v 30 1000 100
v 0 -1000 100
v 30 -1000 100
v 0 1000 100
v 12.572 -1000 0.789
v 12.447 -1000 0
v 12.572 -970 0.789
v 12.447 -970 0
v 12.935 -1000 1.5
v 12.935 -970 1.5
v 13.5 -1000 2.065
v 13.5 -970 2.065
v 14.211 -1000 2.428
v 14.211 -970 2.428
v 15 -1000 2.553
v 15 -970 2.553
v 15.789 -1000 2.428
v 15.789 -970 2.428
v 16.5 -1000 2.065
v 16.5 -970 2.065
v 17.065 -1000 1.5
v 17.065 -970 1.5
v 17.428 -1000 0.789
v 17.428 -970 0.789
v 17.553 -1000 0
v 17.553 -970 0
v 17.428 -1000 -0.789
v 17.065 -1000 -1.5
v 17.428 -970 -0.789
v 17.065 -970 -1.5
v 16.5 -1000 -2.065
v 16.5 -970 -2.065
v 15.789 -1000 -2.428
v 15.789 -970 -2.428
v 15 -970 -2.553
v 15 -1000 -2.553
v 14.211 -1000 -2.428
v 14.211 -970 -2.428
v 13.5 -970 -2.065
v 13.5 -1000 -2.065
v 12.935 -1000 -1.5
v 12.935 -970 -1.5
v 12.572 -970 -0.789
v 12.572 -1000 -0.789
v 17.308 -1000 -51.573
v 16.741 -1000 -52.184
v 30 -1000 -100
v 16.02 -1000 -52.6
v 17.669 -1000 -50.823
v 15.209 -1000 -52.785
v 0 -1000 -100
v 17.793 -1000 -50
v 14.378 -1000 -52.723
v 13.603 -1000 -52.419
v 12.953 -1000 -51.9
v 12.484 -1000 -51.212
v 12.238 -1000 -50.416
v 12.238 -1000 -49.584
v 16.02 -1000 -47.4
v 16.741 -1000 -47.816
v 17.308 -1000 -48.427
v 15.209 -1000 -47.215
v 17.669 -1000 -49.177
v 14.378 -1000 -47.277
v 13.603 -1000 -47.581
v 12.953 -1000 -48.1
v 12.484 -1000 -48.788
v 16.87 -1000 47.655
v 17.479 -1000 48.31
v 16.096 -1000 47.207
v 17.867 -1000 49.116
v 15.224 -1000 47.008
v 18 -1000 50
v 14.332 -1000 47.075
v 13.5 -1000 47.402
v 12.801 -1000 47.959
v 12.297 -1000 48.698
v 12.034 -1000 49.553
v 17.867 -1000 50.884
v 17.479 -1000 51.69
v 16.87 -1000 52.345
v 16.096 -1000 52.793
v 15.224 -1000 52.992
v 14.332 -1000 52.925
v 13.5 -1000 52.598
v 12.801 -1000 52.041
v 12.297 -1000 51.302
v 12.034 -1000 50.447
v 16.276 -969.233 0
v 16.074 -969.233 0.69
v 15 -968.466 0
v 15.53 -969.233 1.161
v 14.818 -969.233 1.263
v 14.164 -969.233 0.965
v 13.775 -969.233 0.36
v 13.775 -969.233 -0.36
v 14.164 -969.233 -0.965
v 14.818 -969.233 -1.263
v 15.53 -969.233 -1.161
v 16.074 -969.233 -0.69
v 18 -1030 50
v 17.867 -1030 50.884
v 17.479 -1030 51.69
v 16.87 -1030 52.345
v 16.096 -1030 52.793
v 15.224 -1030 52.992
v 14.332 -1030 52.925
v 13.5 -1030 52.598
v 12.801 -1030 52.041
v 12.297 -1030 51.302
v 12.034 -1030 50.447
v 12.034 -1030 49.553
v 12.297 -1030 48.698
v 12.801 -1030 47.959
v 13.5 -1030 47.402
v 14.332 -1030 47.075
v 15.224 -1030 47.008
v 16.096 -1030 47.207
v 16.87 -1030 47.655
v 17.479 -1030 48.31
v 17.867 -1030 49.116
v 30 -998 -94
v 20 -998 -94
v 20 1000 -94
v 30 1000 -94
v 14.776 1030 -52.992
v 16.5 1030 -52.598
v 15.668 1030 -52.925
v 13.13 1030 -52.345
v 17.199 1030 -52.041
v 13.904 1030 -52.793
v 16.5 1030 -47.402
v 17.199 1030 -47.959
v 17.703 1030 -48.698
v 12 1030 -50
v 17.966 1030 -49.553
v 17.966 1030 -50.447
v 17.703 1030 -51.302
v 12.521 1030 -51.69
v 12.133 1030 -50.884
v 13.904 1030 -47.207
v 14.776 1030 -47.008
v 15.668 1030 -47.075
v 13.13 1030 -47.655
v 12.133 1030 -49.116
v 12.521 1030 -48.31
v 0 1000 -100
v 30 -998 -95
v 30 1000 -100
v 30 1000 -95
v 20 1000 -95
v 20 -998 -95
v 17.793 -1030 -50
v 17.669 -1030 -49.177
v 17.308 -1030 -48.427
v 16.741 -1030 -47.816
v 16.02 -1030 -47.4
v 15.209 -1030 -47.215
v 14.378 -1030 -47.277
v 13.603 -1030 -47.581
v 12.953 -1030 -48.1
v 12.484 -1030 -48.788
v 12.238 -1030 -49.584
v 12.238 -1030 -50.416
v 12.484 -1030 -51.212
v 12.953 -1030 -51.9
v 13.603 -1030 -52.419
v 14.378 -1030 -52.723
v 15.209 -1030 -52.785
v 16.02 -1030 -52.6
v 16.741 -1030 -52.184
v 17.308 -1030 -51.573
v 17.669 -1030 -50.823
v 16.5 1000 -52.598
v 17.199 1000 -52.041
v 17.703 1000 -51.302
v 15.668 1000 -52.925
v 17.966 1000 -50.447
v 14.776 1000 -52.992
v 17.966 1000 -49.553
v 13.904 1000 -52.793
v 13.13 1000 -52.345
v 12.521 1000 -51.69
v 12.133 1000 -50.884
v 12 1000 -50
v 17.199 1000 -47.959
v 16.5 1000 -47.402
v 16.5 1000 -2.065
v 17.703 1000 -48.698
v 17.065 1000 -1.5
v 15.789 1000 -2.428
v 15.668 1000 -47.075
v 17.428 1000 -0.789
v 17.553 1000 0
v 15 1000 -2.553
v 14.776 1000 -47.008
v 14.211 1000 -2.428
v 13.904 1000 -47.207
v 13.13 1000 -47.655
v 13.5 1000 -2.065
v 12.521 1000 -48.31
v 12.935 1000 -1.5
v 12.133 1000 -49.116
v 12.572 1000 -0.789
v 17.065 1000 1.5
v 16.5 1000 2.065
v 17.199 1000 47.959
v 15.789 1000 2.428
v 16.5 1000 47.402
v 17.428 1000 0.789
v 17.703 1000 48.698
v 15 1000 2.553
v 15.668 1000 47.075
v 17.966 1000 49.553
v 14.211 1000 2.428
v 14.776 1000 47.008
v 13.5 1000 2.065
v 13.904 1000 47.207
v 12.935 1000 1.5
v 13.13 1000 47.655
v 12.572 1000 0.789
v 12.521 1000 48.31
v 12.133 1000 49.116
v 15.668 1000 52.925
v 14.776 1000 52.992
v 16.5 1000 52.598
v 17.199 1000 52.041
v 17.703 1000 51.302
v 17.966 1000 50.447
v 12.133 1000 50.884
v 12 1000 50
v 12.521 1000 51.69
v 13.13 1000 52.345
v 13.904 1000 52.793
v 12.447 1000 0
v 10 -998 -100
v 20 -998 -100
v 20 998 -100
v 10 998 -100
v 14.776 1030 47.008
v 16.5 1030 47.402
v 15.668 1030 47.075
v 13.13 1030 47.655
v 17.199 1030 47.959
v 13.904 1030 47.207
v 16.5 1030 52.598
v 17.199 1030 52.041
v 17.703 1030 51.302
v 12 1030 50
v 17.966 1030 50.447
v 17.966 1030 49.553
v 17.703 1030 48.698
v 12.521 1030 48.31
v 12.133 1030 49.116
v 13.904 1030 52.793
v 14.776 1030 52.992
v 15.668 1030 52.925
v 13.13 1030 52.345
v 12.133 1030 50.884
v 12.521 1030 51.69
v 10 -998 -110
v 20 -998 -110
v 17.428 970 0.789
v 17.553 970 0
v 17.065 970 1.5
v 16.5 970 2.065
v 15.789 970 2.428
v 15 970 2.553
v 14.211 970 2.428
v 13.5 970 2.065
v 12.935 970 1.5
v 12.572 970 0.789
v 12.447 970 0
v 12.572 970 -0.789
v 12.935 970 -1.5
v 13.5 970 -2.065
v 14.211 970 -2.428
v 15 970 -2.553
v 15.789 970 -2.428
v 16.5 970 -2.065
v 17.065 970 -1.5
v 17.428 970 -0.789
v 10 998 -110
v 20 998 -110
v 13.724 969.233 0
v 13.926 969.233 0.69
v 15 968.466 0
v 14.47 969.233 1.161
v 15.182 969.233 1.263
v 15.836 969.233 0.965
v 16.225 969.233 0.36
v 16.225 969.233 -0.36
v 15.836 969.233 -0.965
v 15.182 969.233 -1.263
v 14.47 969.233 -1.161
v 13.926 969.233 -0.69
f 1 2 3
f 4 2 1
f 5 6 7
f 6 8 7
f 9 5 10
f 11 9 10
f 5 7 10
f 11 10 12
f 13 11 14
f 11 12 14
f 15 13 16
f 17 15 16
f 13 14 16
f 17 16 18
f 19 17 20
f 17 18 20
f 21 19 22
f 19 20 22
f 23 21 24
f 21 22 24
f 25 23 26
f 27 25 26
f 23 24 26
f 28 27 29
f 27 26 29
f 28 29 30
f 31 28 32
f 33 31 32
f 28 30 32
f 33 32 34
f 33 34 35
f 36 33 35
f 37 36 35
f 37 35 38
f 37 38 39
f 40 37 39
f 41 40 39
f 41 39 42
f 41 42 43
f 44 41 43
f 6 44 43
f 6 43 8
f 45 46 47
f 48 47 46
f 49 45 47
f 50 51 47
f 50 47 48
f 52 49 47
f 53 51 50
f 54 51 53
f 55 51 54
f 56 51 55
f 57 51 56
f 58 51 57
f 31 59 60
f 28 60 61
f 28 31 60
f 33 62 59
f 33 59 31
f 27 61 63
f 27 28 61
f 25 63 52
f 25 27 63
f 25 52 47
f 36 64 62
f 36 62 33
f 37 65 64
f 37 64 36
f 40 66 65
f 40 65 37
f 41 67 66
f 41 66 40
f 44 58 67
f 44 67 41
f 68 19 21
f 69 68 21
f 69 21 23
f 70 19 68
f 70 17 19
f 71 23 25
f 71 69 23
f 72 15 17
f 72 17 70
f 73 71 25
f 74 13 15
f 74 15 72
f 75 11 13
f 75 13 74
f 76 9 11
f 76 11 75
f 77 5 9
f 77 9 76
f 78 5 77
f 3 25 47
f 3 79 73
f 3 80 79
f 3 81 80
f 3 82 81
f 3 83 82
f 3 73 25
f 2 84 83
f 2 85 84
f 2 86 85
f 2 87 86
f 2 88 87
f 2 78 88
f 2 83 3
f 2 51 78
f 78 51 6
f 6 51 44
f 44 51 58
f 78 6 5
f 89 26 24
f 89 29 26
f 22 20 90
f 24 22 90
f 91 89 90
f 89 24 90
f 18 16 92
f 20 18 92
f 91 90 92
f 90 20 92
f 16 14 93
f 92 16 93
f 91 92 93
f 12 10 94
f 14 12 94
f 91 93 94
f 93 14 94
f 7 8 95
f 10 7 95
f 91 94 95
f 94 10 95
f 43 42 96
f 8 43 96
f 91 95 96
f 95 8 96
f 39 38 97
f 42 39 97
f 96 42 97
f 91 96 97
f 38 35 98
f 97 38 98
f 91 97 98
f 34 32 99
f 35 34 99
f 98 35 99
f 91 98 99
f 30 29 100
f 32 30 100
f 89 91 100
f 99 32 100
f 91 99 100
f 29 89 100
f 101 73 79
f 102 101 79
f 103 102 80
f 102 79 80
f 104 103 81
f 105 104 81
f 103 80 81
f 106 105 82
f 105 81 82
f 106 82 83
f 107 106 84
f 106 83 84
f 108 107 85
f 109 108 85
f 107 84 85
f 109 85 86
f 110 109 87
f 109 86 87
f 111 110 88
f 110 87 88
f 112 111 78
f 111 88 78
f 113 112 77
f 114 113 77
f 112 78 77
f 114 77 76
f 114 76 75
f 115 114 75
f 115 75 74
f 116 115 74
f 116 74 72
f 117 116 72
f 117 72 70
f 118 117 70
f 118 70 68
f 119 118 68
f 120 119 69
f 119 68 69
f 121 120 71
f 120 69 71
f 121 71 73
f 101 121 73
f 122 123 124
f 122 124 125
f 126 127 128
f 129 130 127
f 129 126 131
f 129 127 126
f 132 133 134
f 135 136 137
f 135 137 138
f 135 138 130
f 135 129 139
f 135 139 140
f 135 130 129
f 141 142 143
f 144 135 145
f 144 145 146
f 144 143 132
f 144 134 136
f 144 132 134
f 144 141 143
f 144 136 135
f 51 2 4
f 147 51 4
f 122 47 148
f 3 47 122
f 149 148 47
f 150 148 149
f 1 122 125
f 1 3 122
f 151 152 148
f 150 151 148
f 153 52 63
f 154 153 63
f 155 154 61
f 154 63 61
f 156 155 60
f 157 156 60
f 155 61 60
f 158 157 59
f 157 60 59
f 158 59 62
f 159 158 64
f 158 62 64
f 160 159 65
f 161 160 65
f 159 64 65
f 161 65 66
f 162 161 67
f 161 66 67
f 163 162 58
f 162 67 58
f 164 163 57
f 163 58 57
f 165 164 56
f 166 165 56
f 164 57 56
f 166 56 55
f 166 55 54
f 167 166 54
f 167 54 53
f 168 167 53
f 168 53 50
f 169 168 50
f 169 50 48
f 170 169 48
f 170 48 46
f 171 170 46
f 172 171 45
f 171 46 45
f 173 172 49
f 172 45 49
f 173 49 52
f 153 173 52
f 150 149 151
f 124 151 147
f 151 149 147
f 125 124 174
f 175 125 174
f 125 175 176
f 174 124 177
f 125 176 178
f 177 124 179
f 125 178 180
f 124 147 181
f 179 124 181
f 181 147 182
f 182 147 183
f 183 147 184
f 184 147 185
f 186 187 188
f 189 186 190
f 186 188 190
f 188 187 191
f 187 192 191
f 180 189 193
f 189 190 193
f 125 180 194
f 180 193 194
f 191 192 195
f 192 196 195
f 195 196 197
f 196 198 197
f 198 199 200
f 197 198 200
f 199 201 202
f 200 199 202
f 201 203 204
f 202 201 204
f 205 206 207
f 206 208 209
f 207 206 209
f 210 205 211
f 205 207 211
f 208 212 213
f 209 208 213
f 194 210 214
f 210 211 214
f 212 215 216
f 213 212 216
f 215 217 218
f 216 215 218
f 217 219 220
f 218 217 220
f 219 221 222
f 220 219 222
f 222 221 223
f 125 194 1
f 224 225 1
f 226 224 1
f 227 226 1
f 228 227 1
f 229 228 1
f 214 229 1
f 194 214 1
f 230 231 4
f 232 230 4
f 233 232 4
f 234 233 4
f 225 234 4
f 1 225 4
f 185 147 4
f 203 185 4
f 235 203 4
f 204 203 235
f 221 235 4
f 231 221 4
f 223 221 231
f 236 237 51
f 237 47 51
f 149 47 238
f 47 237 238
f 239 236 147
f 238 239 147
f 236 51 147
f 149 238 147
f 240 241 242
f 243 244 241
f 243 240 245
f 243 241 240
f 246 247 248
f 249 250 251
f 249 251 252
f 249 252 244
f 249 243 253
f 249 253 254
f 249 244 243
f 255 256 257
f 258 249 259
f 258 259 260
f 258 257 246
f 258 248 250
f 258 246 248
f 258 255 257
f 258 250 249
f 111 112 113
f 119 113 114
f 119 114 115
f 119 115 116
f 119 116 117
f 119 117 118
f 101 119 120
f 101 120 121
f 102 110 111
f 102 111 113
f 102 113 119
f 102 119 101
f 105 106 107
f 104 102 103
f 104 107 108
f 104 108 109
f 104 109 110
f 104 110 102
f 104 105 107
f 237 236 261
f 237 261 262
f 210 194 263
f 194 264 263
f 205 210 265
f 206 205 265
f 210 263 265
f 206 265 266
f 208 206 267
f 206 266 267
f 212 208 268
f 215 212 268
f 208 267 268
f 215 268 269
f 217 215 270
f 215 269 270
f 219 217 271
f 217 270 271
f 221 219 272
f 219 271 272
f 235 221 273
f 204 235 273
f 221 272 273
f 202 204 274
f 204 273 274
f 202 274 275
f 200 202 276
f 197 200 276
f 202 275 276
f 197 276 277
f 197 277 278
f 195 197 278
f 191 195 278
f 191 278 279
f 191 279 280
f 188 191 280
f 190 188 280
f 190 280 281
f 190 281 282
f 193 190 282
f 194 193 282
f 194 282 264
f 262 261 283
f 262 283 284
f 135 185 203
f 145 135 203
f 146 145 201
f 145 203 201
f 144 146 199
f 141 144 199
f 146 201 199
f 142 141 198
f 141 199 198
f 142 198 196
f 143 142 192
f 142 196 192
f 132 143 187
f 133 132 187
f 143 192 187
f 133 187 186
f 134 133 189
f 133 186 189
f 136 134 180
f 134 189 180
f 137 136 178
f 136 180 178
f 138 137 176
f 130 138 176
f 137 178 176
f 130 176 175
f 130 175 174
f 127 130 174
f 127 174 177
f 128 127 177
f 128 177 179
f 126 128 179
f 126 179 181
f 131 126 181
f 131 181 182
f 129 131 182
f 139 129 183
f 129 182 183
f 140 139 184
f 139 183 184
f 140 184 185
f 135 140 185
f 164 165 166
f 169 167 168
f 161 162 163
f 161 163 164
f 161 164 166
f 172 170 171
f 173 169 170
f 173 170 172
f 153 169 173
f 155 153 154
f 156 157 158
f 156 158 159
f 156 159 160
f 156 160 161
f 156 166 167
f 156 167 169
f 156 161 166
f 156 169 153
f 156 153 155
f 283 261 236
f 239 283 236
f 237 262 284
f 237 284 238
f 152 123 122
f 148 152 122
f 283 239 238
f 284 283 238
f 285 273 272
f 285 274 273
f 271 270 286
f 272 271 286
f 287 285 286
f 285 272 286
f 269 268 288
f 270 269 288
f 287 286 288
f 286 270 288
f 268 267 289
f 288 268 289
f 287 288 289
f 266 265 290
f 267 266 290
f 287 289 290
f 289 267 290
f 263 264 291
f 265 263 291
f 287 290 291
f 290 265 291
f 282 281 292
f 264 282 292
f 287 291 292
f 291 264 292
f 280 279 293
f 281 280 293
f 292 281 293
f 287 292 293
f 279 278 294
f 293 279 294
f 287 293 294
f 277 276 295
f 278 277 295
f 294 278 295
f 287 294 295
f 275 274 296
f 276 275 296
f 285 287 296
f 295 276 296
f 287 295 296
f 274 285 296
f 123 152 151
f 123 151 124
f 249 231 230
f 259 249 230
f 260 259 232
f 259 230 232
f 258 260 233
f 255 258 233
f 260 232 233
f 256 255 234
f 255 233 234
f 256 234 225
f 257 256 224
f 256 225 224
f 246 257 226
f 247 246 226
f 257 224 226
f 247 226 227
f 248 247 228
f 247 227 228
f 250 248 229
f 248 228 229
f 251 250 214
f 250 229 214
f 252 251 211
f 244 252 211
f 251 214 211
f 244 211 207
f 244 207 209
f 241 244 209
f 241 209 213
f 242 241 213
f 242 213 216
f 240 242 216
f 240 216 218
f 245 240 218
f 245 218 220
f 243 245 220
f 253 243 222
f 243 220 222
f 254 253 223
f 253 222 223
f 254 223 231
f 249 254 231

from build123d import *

# Parameters (mm, degrees)
F0_W      = 2000
F0_H      = 200
F1_DEPTH  = 30
F2_R      = 3
F3_DEPTH  = 30
F5_START  = -2
F4_W      = 10
F4_H      = 10
F5_DEPTH  = 1996
F6_R      = 3
F6_R_2    = 2.7931016095
F7_DEPTH  = 30
F8_W      = 10
F8_H      = 1
F9_DEPTH  = 2000
F10_D     = 5.1054
F10_DEPTH = 30
F10_TIP   = 1.5338169022
F11_D     = 5.1054
F11_DEPTH = 30
F11_TIP   = 1.5338169022


with BuildPart() as f1:
    # F0 (on Right) → F1 (new body)
    with BuildSketch(Plane.YZ):
        Rectangle(F0_W, F0_H)
    extrude(amount=F1_DEPTH)

    # F2 (on face) → F3 (join)
    with BuildSketch(Plane(origin=(0, 1000, 0), x_dir=(-1, 0, 0), z_dir=(0, 1, 0))):
        with Locations((-15, -50)):
            Circle(F2_R)
        with Locations((-15, 50)):
            Circle(F2_R)
    extrude(amount=F3_DEPTH)

    # F4 (on face) → F5 (join)
    with BuildSketch(Plane.XZ.offset(1000).offset(F5_START)):
        with Locations((15, -105)):
            Rectangle(F4_W, F4_H)
    extrude(amount=-F5_DEPTH)

    # F6 (on face) → F7 (join)
    with BuildSketch(Plane.XZ.offset(1000)):
        with Locations((15, 50)):
            Circle(F6_R)
        with Locations((15, -50)):
            Circle(F6_R_2)
    extrude(amount=F7_DEPTH)

    # F8 (on face) → F9 (cut)
    with BuildSketch(Plane.XZ.offset(998)):
        with Locations((25, -94.5)):
            Rectangle(F8_W, F8_H)
    extrude(amount=-F9_DEPTH, mode=Mode.SUBTRACT)

    # F10
    with Locations(Plane(origin=(0, 1000, 0), x_dir=(-1, 0, 0), z_dir=(0, 1, 0))):
        with Locations((-15, 0)):
            Hole(F10_D / 2, depth=F10_DEPTH)
            with Locations((0, 0, -(F10_DEPTH + F10_TIP / 2))):  # 118° drill point
                Cone(0, F10_D / 2, F10_TIP, mode=Mode.SUBTRACT)

    # F11
    with Locations(Plane.XZ.offset(1000)):
        with Locations((15, 0)):
            Hole(F11_D / 2, depth=F11_DEPTH)
            with Locations((0, 0, -(F11_DEPTH + F11_TIP / 2))):  # 118° drill point
                Cone(0, F11_D / 2, F11_TIP, mode=Mode.SUBTRACT)


solid = f1.part
